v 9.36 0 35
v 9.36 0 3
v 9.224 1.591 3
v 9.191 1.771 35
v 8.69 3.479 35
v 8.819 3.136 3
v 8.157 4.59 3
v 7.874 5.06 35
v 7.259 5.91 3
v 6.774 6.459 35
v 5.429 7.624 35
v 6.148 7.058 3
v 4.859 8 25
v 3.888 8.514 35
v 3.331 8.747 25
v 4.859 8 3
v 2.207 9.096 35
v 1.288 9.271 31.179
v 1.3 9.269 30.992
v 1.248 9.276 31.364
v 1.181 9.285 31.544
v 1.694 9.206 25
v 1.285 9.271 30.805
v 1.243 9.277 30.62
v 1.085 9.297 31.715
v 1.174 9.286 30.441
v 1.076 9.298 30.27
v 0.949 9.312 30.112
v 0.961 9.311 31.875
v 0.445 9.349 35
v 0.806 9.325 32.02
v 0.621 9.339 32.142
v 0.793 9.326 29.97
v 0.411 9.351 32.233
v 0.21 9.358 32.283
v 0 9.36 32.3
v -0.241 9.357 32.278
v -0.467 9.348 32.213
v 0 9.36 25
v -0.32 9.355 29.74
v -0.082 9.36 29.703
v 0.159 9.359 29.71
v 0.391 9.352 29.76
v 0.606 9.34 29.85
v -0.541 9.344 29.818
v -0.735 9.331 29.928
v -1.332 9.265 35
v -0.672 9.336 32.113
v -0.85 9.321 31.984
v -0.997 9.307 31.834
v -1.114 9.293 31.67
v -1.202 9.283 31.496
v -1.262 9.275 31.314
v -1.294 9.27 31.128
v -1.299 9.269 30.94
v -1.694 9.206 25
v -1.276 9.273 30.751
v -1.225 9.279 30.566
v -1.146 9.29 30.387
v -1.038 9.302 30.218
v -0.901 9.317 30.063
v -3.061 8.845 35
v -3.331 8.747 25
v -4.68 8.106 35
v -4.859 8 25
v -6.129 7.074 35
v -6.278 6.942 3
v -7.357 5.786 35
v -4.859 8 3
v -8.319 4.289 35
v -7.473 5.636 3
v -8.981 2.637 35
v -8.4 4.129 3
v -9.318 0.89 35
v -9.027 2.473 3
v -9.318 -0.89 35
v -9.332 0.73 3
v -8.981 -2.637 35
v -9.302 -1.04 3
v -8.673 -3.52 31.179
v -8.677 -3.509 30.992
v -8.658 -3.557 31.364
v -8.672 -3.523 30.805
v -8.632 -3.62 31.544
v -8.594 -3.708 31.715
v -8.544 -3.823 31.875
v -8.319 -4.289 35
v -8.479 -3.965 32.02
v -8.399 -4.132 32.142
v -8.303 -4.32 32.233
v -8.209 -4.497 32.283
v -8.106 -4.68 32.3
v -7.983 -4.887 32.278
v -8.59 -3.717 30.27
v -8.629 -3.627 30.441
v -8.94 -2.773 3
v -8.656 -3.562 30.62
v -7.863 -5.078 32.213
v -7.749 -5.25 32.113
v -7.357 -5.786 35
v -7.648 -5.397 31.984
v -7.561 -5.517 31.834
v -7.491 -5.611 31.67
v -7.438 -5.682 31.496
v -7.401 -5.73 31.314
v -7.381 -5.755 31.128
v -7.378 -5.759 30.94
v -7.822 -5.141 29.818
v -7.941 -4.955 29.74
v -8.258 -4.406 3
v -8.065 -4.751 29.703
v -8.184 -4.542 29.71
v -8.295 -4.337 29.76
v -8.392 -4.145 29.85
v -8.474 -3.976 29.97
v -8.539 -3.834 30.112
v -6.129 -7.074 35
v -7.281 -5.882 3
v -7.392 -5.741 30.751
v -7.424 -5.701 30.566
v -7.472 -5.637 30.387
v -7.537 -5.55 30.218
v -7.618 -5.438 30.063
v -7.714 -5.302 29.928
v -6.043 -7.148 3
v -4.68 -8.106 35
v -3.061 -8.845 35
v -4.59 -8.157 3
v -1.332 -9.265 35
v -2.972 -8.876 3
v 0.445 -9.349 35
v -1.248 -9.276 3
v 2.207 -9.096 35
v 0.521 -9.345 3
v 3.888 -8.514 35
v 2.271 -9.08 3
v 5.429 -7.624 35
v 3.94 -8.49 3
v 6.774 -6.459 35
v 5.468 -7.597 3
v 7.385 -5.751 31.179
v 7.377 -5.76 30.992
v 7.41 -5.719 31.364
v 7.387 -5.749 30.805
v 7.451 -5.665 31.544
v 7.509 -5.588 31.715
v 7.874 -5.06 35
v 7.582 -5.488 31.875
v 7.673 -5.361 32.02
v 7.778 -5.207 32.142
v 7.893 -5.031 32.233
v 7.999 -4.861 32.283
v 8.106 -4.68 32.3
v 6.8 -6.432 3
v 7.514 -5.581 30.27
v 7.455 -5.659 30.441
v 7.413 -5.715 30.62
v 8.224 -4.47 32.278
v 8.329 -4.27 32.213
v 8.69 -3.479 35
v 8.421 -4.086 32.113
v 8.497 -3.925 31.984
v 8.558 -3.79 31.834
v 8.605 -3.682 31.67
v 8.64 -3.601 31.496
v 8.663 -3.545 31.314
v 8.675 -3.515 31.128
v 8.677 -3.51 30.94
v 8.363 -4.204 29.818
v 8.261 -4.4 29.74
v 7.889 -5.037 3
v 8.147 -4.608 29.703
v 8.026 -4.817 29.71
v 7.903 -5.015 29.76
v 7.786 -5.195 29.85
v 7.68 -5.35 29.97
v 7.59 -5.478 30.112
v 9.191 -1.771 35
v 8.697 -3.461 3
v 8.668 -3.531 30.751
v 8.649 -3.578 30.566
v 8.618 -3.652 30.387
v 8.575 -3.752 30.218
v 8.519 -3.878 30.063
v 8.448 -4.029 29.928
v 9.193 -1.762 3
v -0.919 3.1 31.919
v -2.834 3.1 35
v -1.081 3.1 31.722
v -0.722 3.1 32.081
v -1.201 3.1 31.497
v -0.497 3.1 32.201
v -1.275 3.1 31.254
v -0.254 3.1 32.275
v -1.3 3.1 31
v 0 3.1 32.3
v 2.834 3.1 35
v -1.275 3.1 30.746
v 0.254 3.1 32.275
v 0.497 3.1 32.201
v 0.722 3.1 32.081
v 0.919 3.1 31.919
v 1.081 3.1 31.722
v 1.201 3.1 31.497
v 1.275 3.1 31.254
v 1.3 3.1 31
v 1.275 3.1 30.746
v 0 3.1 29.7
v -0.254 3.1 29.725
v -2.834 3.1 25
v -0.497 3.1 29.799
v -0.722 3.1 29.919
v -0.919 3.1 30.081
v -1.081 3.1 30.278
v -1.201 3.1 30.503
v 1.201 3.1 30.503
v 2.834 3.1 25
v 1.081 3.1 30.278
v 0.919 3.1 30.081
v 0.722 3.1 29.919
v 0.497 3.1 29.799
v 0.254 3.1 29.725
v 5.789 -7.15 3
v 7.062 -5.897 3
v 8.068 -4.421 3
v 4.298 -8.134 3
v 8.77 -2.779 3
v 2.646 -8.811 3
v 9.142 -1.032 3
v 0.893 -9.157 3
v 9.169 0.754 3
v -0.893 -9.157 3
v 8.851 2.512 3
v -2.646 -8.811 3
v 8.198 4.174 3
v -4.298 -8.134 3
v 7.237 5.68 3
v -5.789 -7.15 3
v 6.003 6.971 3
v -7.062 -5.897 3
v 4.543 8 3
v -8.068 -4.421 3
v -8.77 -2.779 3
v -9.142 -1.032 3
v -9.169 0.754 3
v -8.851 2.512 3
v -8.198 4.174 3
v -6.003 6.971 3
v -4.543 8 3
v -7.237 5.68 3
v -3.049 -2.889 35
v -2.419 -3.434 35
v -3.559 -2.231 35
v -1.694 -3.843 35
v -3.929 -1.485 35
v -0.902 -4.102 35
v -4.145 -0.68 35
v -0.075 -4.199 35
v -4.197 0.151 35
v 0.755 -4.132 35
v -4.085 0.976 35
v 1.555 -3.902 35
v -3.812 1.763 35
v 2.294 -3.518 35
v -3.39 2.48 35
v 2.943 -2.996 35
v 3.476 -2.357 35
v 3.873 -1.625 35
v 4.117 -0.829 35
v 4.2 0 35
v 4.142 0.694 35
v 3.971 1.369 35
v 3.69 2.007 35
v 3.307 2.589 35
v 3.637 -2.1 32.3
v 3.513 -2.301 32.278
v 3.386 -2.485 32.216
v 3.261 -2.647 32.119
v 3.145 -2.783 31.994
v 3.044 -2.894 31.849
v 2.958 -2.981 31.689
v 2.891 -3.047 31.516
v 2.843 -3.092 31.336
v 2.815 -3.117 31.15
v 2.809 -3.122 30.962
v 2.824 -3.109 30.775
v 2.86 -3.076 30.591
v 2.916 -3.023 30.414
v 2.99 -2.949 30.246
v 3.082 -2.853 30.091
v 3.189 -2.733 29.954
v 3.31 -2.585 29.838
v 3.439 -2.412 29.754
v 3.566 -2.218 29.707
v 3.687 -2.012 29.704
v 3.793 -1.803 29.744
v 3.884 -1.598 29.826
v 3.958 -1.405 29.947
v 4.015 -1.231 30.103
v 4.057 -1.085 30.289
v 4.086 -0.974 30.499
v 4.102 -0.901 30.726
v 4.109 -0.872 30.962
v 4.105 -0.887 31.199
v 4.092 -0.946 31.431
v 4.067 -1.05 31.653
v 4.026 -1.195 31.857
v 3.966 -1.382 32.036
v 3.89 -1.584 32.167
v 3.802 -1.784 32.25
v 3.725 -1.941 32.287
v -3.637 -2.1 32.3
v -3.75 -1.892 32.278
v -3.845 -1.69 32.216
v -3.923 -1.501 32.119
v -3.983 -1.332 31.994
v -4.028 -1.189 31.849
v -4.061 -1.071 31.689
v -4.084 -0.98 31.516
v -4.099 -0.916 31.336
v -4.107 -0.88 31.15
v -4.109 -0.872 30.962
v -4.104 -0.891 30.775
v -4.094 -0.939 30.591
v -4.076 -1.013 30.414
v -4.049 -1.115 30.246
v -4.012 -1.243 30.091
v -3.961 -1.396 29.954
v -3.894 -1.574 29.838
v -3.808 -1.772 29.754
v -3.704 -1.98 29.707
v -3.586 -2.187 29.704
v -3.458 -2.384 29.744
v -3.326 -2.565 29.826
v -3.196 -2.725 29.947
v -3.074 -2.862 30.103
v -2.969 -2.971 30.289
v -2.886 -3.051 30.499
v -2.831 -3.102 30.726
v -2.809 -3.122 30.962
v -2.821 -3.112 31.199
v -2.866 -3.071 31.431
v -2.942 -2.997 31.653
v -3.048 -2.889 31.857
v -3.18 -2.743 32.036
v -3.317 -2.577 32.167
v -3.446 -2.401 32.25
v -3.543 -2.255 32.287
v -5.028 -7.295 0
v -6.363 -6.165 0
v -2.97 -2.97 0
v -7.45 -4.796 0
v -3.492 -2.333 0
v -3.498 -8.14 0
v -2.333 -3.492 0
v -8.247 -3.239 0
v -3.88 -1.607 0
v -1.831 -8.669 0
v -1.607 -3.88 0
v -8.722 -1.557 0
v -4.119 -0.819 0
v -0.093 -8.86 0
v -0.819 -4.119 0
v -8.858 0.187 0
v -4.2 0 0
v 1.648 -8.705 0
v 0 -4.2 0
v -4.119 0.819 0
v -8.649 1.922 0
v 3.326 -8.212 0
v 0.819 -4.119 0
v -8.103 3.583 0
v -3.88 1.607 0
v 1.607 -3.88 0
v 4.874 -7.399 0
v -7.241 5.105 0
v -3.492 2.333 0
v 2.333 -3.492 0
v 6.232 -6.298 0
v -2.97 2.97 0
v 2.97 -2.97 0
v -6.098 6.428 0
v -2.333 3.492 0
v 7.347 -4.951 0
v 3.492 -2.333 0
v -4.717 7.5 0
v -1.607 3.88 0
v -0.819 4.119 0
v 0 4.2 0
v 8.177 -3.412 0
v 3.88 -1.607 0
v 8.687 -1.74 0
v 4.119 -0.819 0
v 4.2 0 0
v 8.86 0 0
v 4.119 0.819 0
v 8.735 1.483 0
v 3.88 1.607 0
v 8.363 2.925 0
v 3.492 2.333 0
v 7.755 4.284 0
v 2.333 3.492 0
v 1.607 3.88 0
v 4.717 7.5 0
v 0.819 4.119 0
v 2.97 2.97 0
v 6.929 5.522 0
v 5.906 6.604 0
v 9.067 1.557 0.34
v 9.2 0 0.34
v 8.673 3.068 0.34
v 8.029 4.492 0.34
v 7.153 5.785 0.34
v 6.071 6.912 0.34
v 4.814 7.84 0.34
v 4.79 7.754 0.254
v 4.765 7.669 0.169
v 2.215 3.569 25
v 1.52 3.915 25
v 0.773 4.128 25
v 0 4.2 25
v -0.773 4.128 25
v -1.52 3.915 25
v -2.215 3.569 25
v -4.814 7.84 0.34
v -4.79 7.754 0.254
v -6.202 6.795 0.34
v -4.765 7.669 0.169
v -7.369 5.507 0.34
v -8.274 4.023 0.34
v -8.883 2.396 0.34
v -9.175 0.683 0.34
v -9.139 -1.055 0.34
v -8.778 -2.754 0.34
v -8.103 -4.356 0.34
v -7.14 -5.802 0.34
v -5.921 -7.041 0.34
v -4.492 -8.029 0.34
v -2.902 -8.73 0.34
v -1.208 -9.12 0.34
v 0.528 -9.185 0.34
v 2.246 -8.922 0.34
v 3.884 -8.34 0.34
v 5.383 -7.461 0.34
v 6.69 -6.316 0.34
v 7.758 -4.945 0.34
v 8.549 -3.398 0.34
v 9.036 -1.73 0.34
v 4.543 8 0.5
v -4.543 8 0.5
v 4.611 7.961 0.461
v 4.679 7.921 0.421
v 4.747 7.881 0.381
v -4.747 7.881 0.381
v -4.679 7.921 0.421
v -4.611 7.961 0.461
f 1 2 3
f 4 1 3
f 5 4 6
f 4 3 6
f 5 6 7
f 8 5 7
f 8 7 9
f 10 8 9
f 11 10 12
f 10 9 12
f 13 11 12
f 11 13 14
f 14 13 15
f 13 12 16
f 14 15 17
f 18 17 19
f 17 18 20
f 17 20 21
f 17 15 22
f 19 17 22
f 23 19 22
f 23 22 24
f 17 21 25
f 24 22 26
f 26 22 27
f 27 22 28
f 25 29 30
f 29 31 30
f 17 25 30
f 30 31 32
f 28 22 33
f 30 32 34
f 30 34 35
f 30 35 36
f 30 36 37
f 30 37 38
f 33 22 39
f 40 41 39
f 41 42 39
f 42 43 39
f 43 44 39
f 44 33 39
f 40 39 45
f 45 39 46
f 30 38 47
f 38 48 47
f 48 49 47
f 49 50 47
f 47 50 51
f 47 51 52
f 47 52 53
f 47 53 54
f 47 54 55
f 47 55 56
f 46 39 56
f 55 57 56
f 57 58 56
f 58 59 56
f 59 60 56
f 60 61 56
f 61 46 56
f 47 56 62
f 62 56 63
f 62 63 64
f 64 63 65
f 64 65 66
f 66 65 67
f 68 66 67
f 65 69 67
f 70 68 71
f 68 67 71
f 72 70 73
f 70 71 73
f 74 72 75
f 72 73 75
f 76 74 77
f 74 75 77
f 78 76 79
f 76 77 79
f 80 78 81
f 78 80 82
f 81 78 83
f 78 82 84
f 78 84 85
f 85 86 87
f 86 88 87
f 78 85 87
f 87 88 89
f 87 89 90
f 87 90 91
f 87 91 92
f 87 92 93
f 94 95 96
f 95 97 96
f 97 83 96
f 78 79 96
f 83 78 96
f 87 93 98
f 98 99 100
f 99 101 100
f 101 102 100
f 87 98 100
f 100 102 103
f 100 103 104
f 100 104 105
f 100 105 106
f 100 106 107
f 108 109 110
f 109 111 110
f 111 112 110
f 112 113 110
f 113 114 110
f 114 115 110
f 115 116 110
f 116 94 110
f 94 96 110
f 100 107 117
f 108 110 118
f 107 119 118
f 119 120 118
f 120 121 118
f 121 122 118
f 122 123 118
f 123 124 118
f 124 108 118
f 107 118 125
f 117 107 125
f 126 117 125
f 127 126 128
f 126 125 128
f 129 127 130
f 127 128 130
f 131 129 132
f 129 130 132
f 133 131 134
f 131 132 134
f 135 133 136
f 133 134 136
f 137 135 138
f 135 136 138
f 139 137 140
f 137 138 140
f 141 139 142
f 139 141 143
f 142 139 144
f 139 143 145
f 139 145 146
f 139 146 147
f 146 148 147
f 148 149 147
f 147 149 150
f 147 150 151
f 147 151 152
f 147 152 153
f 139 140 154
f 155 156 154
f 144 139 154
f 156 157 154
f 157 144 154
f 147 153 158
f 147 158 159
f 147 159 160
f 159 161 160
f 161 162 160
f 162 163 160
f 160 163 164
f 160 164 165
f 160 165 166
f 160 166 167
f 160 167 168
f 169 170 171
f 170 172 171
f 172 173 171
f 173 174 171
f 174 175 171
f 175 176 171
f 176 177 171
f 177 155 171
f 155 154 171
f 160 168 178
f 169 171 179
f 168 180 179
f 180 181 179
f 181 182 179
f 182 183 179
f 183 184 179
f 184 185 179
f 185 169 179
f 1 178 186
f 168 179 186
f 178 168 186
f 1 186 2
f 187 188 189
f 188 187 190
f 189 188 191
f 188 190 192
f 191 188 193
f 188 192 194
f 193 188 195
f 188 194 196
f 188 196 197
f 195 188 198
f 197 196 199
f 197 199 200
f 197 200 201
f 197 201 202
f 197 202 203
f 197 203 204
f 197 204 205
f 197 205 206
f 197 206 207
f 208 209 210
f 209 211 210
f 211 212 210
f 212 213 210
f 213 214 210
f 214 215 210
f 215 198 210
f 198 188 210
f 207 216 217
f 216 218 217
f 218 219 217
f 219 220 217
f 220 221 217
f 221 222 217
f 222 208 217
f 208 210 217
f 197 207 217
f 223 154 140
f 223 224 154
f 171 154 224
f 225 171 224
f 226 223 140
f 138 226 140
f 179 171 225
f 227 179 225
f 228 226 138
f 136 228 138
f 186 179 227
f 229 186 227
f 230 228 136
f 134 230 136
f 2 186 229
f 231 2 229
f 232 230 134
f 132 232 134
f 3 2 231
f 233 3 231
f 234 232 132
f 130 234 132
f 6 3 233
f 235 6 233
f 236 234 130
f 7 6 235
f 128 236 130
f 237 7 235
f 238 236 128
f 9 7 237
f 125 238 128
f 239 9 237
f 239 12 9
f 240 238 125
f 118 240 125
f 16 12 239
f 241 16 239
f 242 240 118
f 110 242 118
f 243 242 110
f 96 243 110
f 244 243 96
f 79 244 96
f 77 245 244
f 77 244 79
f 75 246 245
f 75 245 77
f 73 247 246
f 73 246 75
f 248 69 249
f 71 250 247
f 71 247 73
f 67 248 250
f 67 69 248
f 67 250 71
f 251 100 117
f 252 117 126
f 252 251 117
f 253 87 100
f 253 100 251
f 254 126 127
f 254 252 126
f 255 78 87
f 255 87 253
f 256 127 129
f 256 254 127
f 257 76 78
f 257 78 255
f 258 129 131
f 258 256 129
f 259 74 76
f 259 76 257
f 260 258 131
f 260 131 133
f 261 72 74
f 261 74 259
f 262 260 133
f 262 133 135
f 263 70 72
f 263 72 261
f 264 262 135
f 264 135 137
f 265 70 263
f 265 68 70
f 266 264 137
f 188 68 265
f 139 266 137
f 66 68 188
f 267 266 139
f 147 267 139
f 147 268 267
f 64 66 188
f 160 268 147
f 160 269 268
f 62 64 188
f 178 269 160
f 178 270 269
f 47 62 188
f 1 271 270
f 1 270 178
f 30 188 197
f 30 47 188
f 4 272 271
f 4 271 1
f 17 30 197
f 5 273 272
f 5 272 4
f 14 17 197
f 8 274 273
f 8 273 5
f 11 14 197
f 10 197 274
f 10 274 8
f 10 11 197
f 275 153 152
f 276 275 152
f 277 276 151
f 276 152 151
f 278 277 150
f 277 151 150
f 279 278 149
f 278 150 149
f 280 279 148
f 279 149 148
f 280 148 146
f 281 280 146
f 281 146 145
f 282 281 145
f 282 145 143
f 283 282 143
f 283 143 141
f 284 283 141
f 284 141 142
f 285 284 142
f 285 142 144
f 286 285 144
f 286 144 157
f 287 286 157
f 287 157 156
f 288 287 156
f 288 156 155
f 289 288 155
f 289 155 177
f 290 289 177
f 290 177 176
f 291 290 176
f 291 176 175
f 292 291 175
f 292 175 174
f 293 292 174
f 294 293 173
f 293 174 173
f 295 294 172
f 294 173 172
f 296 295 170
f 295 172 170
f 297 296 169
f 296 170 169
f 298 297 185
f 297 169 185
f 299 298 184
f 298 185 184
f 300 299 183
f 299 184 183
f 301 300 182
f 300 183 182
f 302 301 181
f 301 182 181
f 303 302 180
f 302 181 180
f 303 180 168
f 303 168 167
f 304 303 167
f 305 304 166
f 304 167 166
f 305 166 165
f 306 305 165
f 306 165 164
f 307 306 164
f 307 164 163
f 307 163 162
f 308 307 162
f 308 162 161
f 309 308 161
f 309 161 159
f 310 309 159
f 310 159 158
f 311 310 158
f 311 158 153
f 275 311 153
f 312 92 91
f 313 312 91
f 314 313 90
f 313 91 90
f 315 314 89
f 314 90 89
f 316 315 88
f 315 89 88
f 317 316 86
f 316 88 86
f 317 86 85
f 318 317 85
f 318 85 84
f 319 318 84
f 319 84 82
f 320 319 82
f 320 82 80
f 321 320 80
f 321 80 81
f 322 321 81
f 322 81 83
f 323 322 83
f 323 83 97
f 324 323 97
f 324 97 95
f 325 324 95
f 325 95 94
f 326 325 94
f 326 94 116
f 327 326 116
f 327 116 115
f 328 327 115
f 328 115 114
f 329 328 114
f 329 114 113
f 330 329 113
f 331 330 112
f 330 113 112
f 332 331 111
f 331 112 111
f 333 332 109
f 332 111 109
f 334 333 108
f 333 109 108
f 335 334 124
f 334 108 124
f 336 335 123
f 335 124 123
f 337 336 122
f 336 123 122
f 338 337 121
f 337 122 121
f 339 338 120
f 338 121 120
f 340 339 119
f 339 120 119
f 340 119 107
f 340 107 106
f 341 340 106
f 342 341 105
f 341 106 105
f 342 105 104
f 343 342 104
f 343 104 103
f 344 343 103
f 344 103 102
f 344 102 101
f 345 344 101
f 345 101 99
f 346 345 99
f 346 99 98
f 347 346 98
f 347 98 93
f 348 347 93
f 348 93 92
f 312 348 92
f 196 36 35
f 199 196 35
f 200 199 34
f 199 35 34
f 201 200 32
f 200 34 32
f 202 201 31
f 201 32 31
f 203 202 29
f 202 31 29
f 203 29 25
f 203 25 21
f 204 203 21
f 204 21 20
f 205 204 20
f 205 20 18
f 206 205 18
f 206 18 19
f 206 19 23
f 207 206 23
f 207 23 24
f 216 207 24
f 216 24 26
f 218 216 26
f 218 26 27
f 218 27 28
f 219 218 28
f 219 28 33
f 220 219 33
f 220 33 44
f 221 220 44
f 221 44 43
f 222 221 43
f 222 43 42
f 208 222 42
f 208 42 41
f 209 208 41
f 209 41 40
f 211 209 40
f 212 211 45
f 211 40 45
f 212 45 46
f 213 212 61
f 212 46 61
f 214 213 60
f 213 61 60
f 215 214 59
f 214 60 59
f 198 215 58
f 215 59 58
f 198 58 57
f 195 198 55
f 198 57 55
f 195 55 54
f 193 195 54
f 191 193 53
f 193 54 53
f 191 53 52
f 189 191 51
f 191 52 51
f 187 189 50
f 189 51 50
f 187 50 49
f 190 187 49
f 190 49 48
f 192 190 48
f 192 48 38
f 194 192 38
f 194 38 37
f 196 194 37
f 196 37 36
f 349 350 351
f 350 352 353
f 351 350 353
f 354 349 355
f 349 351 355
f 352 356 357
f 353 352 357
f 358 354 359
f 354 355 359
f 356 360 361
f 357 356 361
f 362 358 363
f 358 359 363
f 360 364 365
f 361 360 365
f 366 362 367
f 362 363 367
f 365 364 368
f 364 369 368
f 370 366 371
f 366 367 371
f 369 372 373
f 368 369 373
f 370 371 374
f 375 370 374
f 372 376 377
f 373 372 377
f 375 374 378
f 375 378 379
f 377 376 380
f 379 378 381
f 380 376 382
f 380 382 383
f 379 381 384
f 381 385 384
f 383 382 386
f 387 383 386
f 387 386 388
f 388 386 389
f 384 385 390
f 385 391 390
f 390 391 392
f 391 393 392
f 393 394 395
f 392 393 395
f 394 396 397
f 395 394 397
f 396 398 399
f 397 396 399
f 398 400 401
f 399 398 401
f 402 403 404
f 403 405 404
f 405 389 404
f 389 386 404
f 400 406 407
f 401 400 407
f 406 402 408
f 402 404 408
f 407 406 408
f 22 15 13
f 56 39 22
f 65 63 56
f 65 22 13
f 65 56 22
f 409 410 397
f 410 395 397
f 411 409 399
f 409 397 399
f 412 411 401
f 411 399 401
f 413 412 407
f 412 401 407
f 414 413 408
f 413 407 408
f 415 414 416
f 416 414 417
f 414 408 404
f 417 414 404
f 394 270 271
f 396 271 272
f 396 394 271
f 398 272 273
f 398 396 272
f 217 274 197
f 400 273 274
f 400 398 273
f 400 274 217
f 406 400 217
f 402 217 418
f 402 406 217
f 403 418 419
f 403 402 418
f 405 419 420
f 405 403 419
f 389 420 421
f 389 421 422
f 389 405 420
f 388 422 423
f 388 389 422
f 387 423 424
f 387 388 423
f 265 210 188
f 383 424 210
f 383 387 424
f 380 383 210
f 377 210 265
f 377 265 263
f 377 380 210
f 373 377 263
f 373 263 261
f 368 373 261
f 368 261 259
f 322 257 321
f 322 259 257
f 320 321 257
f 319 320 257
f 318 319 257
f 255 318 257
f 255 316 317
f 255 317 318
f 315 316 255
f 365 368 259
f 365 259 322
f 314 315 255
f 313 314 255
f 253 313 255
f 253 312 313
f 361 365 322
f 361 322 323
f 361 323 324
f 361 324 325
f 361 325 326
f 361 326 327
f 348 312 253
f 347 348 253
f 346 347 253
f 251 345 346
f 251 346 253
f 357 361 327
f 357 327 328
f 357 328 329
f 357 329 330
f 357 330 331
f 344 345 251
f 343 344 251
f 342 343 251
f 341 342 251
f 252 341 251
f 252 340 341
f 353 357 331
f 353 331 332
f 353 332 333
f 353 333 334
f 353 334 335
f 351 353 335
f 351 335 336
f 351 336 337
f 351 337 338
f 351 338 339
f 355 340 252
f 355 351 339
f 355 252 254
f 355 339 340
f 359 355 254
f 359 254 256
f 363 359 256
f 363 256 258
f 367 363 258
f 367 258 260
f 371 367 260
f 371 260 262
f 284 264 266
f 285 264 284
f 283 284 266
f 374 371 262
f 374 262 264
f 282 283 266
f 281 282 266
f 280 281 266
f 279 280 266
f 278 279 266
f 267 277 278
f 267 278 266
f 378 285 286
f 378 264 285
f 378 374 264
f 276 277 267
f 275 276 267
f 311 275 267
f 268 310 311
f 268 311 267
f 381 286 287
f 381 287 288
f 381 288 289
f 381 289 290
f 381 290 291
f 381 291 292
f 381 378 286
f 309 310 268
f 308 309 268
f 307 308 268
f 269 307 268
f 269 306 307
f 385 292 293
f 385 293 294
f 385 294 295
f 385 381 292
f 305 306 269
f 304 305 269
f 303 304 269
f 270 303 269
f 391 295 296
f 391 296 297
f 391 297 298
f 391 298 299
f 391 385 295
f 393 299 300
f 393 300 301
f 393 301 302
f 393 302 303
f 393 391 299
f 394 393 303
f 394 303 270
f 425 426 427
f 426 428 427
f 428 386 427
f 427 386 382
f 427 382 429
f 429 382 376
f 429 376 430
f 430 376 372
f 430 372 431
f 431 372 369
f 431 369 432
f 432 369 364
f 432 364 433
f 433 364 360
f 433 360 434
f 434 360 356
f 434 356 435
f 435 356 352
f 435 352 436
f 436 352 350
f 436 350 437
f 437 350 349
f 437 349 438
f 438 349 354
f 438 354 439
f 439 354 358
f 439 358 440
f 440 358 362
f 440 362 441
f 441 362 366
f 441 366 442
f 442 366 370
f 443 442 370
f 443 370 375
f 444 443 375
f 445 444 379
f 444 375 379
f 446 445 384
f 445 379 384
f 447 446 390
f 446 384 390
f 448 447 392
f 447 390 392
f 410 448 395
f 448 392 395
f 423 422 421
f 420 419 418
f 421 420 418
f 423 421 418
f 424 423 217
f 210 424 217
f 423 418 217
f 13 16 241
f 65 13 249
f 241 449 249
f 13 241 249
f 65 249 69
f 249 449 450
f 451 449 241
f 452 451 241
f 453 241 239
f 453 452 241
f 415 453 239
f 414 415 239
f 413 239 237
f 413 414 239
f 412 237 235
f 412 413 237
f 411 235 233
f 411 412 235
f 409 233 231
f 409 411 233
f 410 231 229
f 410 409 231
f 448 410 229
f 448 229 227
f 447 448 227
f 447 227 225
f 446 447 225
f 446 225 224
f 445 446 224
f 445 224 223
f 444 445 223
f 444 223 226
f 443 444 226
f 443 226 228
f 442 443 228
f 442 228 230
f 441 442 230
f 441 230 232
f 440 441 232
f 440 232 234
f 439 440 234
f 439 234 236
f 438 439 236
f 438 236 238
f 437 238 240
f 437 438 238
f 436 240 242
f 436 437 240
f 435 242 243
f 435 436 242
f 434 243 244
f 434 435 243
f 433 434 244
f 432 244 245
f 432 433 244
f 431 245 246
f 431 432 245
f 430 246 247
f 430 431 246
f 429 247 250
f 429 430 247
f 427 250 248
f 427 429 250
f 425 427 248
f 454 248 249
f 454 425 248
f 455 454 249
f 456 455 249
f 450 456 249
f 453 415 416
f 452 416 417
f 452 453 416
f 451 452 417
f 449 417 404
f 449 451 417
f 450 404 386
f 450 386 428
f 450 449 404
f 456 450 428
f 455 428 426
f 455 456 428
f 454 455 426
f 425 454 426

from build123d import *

# Parameters (mm, degrees)
SKETCH_2_R               = 9.36
SKETCH_2_R_2             = 4.2
EXTRUDE_1_DEPTH          = 35
EXTRUDE_START            = -10
EXTRUDE_2_DEPTH          = 10
CUT_EXTRUDE_1_REACH      = 42.78
SKETCH_3_R               = 1.3
PATTERN_CIRCULAR_1_COUNT = 3
CUT_EXTRUDE_2_DEPTH      = 25
CHAMFER_1_SIZE           = 0.5
SKETCH_7_R               = 9.5
SKETCH_7_R_2             = 9.2
CUT_EXTRUDE_3_DEPTH      = 3


with BuildPart() as part:
    # Эскиз2 → Бобышка-Вытянуть1 (new body)
    with BuildSketch(Plane.XY):
        Circle(SKETCH_2_R)
        Circle(SKETCH_2_R_2, mode=Mode.SUBTRACT)
    extrude(amount=EXTRUDE_1_DEPTH)

    # Эскиз4 → Бобышка-Вытянуть2 (add)
    with BuildSketch(Plane.XY.offset(35).offset(EXTRUDE_START)):
        with BuildLine():
            Line((-2.833725463, 3.1), (2.833725463, 3.1))
            ThreePointArc((2.833725463, 3.1), (0, 4.2), (-2.833725463, 3.1))
        make_face()
    extrude(amount=EXTRUDE_2_DEPTH)

    # Эскиз3 → Вырез-Вытянуть1 (cut, up to next)
    with BuildSketch(Plane(origin=(0, 9.36, 0), x_dir=(1, 0, 0), z_dir=(0, 1, 0)), mode=Mode.PRIVATE) as cut_extrude_1_sk1:
        with Locations(Location((0, -31, 0), (0, 0, 270))):
            Circle(SKETCH_3_R)
    cut_extrude_1_tool1 = extrude(cut_extrude_1_sk1.sketch, amount=-CUT_EXTRUDE_1_REACH, mode=Mode.PRIVATE) & part.part
    cut_extrude_1 = cut_extrude_1_tool1.solids().sort_by_distance((0, 9.36, 31))[0]
    add(cut_extrude_1, mode=Mode.SUBTRACT)

    # Круговой массив1: Вырез-Вытянуть1 ×3 about axis
    pattern_circular_1_axis = Axis((0, 0, 35), (0, 0, -1))
    for i in range(1, PATTERN_CIRCULAR_1_COUNT):
        add(cut_extrude_1.rotate(pattern_circular_1_axis, i * 360 / PATTERN_CIRCULAR_1_COUNT), mode=Mode.SUBTRACT)

    # Эскиз5 → Вырез-Вытянуть2 (cut)
    with BuildSketch(Plane(origin=(0, 0, 0), x_dir=(-1, 0, 0), z_dir=(0, 0, -1))):
        with BuildLine():
            Line((-4.858971084, 8), (4.858971084, 8))
            ThreePointArc((4.858971084, 8), (0, 9.36), (-4.858971084, 8))
        make_face()
    extrude(amount=-CUT_EXTRUDE_2_DEPTH, mode=Mode.SUBTRACT)

    # Фаска1
    chamfer_1_edges = [part.edges().sort_by_distance(p)[0] for p in [
        (-4.589642178, -8.157498678, 0),
        (0, 8, 0),
    ]]
    chamfer(chamfer_1_edges, length=CHAMFER_1_SIZE)

    # Эскиз7 → Вырез-Вытянуть3 (cut)
    with BuildSketch(Plane(origin=(0, 0, 0), x_dir=(-1, 0, 0), z_dir=(0, 0, -1))):
        Circle(SKETCH_7_R)
        Circle(SKETCH_7_R_2, mode=Mode.SUBTRACT)
    extrude(amount=-CUT_EXTRUDE_3_DEPTH, mode=Mode.SUBTRACT)


solid = part.part
